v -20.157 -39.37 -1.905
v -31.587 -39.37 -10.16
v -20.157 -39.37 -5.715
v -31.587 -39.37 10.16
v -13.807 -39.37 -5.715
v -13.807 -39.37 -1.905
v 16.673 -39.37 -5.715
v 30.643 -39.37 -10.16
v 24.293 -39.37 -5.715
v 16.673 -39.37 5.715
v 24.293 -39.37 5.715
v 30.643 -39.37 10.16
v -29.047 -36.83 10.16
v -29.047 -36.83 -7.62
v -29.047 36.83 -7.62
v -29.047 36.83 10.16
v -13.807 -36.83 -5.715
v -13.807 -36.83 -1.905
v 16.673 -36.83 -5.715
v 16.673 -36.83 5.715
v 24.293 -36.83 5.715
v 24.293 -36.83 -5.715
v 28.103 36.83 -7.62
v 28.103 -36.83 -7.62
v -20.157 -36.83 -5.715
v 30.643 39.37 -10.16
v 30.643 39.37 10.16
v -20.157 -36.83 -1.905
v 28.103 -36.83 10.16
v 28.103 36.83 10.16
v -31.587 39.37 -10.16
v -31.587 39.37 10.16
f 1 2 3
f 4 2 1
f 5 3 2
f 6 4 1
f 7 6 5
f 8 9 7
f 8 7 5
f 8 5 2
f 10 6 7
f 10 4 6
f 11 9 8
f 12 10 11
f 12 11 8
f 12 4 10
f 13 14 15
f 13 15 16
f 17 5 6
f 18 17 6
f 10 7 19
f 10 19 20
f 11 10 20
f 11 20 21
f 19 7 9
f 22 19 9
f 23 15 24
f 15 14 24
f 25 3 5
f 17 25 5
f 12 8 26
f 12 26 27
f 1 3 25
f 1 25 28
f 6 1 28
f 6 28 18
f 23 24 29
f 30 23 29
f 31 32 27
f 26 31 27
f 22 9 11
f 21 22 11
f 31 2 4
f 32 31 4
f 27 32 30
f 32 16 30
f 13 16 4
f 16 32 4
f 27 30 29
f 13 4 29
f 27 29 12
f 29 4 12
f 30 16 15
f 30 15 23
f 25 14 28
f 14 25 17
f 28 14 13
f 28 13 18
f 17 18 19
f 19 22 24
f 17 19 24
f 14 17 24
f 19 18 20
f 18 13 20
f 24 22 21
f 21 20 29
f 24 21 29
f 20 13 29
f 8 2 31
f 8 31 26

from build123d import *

# Parameters (mm, degrees)
F0_W     = 62.23
F0_H     = 20.32
F1_DEPTH = 39.37
F2_T     = -2.54
F3_W     = 6.35
F3_H     = 3.81
F3_W_2   = 7.62
F3_H_2   = 11.43
F4_DEPTH = 25.4


with BuildPart() as f1:
    # F0 (on Front) → F1 (new body, symmetric)
    with BuildSketch(Plane.XZ):
        with Locations((-0.471618, 0)):
            Rectangle(F0_W, F0_H)
    extrude(amount=F1_DEPTH, both=True)

    # F2
    f2_openings = [f1.faces().sort_by_distance(p)[0] for p in [
        (-0.471618, 0, 10.16),
    ]]
    offset(amount=F2_T, openings=f2_openings)

    # F3 (on face) → F4 (cut)
    with BuildSketch(Plane.XZ.offset(39.37)):
        with Locations((-16.981618, -3.81)):
            Rectangle(F3_W, F3_H)
        with Locations((20.483382, 0)):
            Rectangle(F3_W_2, F3_H_2)
    extrude(amount=-F4_DEPTH, mode=Mode.SUBTRACT)


solid = f1.part
